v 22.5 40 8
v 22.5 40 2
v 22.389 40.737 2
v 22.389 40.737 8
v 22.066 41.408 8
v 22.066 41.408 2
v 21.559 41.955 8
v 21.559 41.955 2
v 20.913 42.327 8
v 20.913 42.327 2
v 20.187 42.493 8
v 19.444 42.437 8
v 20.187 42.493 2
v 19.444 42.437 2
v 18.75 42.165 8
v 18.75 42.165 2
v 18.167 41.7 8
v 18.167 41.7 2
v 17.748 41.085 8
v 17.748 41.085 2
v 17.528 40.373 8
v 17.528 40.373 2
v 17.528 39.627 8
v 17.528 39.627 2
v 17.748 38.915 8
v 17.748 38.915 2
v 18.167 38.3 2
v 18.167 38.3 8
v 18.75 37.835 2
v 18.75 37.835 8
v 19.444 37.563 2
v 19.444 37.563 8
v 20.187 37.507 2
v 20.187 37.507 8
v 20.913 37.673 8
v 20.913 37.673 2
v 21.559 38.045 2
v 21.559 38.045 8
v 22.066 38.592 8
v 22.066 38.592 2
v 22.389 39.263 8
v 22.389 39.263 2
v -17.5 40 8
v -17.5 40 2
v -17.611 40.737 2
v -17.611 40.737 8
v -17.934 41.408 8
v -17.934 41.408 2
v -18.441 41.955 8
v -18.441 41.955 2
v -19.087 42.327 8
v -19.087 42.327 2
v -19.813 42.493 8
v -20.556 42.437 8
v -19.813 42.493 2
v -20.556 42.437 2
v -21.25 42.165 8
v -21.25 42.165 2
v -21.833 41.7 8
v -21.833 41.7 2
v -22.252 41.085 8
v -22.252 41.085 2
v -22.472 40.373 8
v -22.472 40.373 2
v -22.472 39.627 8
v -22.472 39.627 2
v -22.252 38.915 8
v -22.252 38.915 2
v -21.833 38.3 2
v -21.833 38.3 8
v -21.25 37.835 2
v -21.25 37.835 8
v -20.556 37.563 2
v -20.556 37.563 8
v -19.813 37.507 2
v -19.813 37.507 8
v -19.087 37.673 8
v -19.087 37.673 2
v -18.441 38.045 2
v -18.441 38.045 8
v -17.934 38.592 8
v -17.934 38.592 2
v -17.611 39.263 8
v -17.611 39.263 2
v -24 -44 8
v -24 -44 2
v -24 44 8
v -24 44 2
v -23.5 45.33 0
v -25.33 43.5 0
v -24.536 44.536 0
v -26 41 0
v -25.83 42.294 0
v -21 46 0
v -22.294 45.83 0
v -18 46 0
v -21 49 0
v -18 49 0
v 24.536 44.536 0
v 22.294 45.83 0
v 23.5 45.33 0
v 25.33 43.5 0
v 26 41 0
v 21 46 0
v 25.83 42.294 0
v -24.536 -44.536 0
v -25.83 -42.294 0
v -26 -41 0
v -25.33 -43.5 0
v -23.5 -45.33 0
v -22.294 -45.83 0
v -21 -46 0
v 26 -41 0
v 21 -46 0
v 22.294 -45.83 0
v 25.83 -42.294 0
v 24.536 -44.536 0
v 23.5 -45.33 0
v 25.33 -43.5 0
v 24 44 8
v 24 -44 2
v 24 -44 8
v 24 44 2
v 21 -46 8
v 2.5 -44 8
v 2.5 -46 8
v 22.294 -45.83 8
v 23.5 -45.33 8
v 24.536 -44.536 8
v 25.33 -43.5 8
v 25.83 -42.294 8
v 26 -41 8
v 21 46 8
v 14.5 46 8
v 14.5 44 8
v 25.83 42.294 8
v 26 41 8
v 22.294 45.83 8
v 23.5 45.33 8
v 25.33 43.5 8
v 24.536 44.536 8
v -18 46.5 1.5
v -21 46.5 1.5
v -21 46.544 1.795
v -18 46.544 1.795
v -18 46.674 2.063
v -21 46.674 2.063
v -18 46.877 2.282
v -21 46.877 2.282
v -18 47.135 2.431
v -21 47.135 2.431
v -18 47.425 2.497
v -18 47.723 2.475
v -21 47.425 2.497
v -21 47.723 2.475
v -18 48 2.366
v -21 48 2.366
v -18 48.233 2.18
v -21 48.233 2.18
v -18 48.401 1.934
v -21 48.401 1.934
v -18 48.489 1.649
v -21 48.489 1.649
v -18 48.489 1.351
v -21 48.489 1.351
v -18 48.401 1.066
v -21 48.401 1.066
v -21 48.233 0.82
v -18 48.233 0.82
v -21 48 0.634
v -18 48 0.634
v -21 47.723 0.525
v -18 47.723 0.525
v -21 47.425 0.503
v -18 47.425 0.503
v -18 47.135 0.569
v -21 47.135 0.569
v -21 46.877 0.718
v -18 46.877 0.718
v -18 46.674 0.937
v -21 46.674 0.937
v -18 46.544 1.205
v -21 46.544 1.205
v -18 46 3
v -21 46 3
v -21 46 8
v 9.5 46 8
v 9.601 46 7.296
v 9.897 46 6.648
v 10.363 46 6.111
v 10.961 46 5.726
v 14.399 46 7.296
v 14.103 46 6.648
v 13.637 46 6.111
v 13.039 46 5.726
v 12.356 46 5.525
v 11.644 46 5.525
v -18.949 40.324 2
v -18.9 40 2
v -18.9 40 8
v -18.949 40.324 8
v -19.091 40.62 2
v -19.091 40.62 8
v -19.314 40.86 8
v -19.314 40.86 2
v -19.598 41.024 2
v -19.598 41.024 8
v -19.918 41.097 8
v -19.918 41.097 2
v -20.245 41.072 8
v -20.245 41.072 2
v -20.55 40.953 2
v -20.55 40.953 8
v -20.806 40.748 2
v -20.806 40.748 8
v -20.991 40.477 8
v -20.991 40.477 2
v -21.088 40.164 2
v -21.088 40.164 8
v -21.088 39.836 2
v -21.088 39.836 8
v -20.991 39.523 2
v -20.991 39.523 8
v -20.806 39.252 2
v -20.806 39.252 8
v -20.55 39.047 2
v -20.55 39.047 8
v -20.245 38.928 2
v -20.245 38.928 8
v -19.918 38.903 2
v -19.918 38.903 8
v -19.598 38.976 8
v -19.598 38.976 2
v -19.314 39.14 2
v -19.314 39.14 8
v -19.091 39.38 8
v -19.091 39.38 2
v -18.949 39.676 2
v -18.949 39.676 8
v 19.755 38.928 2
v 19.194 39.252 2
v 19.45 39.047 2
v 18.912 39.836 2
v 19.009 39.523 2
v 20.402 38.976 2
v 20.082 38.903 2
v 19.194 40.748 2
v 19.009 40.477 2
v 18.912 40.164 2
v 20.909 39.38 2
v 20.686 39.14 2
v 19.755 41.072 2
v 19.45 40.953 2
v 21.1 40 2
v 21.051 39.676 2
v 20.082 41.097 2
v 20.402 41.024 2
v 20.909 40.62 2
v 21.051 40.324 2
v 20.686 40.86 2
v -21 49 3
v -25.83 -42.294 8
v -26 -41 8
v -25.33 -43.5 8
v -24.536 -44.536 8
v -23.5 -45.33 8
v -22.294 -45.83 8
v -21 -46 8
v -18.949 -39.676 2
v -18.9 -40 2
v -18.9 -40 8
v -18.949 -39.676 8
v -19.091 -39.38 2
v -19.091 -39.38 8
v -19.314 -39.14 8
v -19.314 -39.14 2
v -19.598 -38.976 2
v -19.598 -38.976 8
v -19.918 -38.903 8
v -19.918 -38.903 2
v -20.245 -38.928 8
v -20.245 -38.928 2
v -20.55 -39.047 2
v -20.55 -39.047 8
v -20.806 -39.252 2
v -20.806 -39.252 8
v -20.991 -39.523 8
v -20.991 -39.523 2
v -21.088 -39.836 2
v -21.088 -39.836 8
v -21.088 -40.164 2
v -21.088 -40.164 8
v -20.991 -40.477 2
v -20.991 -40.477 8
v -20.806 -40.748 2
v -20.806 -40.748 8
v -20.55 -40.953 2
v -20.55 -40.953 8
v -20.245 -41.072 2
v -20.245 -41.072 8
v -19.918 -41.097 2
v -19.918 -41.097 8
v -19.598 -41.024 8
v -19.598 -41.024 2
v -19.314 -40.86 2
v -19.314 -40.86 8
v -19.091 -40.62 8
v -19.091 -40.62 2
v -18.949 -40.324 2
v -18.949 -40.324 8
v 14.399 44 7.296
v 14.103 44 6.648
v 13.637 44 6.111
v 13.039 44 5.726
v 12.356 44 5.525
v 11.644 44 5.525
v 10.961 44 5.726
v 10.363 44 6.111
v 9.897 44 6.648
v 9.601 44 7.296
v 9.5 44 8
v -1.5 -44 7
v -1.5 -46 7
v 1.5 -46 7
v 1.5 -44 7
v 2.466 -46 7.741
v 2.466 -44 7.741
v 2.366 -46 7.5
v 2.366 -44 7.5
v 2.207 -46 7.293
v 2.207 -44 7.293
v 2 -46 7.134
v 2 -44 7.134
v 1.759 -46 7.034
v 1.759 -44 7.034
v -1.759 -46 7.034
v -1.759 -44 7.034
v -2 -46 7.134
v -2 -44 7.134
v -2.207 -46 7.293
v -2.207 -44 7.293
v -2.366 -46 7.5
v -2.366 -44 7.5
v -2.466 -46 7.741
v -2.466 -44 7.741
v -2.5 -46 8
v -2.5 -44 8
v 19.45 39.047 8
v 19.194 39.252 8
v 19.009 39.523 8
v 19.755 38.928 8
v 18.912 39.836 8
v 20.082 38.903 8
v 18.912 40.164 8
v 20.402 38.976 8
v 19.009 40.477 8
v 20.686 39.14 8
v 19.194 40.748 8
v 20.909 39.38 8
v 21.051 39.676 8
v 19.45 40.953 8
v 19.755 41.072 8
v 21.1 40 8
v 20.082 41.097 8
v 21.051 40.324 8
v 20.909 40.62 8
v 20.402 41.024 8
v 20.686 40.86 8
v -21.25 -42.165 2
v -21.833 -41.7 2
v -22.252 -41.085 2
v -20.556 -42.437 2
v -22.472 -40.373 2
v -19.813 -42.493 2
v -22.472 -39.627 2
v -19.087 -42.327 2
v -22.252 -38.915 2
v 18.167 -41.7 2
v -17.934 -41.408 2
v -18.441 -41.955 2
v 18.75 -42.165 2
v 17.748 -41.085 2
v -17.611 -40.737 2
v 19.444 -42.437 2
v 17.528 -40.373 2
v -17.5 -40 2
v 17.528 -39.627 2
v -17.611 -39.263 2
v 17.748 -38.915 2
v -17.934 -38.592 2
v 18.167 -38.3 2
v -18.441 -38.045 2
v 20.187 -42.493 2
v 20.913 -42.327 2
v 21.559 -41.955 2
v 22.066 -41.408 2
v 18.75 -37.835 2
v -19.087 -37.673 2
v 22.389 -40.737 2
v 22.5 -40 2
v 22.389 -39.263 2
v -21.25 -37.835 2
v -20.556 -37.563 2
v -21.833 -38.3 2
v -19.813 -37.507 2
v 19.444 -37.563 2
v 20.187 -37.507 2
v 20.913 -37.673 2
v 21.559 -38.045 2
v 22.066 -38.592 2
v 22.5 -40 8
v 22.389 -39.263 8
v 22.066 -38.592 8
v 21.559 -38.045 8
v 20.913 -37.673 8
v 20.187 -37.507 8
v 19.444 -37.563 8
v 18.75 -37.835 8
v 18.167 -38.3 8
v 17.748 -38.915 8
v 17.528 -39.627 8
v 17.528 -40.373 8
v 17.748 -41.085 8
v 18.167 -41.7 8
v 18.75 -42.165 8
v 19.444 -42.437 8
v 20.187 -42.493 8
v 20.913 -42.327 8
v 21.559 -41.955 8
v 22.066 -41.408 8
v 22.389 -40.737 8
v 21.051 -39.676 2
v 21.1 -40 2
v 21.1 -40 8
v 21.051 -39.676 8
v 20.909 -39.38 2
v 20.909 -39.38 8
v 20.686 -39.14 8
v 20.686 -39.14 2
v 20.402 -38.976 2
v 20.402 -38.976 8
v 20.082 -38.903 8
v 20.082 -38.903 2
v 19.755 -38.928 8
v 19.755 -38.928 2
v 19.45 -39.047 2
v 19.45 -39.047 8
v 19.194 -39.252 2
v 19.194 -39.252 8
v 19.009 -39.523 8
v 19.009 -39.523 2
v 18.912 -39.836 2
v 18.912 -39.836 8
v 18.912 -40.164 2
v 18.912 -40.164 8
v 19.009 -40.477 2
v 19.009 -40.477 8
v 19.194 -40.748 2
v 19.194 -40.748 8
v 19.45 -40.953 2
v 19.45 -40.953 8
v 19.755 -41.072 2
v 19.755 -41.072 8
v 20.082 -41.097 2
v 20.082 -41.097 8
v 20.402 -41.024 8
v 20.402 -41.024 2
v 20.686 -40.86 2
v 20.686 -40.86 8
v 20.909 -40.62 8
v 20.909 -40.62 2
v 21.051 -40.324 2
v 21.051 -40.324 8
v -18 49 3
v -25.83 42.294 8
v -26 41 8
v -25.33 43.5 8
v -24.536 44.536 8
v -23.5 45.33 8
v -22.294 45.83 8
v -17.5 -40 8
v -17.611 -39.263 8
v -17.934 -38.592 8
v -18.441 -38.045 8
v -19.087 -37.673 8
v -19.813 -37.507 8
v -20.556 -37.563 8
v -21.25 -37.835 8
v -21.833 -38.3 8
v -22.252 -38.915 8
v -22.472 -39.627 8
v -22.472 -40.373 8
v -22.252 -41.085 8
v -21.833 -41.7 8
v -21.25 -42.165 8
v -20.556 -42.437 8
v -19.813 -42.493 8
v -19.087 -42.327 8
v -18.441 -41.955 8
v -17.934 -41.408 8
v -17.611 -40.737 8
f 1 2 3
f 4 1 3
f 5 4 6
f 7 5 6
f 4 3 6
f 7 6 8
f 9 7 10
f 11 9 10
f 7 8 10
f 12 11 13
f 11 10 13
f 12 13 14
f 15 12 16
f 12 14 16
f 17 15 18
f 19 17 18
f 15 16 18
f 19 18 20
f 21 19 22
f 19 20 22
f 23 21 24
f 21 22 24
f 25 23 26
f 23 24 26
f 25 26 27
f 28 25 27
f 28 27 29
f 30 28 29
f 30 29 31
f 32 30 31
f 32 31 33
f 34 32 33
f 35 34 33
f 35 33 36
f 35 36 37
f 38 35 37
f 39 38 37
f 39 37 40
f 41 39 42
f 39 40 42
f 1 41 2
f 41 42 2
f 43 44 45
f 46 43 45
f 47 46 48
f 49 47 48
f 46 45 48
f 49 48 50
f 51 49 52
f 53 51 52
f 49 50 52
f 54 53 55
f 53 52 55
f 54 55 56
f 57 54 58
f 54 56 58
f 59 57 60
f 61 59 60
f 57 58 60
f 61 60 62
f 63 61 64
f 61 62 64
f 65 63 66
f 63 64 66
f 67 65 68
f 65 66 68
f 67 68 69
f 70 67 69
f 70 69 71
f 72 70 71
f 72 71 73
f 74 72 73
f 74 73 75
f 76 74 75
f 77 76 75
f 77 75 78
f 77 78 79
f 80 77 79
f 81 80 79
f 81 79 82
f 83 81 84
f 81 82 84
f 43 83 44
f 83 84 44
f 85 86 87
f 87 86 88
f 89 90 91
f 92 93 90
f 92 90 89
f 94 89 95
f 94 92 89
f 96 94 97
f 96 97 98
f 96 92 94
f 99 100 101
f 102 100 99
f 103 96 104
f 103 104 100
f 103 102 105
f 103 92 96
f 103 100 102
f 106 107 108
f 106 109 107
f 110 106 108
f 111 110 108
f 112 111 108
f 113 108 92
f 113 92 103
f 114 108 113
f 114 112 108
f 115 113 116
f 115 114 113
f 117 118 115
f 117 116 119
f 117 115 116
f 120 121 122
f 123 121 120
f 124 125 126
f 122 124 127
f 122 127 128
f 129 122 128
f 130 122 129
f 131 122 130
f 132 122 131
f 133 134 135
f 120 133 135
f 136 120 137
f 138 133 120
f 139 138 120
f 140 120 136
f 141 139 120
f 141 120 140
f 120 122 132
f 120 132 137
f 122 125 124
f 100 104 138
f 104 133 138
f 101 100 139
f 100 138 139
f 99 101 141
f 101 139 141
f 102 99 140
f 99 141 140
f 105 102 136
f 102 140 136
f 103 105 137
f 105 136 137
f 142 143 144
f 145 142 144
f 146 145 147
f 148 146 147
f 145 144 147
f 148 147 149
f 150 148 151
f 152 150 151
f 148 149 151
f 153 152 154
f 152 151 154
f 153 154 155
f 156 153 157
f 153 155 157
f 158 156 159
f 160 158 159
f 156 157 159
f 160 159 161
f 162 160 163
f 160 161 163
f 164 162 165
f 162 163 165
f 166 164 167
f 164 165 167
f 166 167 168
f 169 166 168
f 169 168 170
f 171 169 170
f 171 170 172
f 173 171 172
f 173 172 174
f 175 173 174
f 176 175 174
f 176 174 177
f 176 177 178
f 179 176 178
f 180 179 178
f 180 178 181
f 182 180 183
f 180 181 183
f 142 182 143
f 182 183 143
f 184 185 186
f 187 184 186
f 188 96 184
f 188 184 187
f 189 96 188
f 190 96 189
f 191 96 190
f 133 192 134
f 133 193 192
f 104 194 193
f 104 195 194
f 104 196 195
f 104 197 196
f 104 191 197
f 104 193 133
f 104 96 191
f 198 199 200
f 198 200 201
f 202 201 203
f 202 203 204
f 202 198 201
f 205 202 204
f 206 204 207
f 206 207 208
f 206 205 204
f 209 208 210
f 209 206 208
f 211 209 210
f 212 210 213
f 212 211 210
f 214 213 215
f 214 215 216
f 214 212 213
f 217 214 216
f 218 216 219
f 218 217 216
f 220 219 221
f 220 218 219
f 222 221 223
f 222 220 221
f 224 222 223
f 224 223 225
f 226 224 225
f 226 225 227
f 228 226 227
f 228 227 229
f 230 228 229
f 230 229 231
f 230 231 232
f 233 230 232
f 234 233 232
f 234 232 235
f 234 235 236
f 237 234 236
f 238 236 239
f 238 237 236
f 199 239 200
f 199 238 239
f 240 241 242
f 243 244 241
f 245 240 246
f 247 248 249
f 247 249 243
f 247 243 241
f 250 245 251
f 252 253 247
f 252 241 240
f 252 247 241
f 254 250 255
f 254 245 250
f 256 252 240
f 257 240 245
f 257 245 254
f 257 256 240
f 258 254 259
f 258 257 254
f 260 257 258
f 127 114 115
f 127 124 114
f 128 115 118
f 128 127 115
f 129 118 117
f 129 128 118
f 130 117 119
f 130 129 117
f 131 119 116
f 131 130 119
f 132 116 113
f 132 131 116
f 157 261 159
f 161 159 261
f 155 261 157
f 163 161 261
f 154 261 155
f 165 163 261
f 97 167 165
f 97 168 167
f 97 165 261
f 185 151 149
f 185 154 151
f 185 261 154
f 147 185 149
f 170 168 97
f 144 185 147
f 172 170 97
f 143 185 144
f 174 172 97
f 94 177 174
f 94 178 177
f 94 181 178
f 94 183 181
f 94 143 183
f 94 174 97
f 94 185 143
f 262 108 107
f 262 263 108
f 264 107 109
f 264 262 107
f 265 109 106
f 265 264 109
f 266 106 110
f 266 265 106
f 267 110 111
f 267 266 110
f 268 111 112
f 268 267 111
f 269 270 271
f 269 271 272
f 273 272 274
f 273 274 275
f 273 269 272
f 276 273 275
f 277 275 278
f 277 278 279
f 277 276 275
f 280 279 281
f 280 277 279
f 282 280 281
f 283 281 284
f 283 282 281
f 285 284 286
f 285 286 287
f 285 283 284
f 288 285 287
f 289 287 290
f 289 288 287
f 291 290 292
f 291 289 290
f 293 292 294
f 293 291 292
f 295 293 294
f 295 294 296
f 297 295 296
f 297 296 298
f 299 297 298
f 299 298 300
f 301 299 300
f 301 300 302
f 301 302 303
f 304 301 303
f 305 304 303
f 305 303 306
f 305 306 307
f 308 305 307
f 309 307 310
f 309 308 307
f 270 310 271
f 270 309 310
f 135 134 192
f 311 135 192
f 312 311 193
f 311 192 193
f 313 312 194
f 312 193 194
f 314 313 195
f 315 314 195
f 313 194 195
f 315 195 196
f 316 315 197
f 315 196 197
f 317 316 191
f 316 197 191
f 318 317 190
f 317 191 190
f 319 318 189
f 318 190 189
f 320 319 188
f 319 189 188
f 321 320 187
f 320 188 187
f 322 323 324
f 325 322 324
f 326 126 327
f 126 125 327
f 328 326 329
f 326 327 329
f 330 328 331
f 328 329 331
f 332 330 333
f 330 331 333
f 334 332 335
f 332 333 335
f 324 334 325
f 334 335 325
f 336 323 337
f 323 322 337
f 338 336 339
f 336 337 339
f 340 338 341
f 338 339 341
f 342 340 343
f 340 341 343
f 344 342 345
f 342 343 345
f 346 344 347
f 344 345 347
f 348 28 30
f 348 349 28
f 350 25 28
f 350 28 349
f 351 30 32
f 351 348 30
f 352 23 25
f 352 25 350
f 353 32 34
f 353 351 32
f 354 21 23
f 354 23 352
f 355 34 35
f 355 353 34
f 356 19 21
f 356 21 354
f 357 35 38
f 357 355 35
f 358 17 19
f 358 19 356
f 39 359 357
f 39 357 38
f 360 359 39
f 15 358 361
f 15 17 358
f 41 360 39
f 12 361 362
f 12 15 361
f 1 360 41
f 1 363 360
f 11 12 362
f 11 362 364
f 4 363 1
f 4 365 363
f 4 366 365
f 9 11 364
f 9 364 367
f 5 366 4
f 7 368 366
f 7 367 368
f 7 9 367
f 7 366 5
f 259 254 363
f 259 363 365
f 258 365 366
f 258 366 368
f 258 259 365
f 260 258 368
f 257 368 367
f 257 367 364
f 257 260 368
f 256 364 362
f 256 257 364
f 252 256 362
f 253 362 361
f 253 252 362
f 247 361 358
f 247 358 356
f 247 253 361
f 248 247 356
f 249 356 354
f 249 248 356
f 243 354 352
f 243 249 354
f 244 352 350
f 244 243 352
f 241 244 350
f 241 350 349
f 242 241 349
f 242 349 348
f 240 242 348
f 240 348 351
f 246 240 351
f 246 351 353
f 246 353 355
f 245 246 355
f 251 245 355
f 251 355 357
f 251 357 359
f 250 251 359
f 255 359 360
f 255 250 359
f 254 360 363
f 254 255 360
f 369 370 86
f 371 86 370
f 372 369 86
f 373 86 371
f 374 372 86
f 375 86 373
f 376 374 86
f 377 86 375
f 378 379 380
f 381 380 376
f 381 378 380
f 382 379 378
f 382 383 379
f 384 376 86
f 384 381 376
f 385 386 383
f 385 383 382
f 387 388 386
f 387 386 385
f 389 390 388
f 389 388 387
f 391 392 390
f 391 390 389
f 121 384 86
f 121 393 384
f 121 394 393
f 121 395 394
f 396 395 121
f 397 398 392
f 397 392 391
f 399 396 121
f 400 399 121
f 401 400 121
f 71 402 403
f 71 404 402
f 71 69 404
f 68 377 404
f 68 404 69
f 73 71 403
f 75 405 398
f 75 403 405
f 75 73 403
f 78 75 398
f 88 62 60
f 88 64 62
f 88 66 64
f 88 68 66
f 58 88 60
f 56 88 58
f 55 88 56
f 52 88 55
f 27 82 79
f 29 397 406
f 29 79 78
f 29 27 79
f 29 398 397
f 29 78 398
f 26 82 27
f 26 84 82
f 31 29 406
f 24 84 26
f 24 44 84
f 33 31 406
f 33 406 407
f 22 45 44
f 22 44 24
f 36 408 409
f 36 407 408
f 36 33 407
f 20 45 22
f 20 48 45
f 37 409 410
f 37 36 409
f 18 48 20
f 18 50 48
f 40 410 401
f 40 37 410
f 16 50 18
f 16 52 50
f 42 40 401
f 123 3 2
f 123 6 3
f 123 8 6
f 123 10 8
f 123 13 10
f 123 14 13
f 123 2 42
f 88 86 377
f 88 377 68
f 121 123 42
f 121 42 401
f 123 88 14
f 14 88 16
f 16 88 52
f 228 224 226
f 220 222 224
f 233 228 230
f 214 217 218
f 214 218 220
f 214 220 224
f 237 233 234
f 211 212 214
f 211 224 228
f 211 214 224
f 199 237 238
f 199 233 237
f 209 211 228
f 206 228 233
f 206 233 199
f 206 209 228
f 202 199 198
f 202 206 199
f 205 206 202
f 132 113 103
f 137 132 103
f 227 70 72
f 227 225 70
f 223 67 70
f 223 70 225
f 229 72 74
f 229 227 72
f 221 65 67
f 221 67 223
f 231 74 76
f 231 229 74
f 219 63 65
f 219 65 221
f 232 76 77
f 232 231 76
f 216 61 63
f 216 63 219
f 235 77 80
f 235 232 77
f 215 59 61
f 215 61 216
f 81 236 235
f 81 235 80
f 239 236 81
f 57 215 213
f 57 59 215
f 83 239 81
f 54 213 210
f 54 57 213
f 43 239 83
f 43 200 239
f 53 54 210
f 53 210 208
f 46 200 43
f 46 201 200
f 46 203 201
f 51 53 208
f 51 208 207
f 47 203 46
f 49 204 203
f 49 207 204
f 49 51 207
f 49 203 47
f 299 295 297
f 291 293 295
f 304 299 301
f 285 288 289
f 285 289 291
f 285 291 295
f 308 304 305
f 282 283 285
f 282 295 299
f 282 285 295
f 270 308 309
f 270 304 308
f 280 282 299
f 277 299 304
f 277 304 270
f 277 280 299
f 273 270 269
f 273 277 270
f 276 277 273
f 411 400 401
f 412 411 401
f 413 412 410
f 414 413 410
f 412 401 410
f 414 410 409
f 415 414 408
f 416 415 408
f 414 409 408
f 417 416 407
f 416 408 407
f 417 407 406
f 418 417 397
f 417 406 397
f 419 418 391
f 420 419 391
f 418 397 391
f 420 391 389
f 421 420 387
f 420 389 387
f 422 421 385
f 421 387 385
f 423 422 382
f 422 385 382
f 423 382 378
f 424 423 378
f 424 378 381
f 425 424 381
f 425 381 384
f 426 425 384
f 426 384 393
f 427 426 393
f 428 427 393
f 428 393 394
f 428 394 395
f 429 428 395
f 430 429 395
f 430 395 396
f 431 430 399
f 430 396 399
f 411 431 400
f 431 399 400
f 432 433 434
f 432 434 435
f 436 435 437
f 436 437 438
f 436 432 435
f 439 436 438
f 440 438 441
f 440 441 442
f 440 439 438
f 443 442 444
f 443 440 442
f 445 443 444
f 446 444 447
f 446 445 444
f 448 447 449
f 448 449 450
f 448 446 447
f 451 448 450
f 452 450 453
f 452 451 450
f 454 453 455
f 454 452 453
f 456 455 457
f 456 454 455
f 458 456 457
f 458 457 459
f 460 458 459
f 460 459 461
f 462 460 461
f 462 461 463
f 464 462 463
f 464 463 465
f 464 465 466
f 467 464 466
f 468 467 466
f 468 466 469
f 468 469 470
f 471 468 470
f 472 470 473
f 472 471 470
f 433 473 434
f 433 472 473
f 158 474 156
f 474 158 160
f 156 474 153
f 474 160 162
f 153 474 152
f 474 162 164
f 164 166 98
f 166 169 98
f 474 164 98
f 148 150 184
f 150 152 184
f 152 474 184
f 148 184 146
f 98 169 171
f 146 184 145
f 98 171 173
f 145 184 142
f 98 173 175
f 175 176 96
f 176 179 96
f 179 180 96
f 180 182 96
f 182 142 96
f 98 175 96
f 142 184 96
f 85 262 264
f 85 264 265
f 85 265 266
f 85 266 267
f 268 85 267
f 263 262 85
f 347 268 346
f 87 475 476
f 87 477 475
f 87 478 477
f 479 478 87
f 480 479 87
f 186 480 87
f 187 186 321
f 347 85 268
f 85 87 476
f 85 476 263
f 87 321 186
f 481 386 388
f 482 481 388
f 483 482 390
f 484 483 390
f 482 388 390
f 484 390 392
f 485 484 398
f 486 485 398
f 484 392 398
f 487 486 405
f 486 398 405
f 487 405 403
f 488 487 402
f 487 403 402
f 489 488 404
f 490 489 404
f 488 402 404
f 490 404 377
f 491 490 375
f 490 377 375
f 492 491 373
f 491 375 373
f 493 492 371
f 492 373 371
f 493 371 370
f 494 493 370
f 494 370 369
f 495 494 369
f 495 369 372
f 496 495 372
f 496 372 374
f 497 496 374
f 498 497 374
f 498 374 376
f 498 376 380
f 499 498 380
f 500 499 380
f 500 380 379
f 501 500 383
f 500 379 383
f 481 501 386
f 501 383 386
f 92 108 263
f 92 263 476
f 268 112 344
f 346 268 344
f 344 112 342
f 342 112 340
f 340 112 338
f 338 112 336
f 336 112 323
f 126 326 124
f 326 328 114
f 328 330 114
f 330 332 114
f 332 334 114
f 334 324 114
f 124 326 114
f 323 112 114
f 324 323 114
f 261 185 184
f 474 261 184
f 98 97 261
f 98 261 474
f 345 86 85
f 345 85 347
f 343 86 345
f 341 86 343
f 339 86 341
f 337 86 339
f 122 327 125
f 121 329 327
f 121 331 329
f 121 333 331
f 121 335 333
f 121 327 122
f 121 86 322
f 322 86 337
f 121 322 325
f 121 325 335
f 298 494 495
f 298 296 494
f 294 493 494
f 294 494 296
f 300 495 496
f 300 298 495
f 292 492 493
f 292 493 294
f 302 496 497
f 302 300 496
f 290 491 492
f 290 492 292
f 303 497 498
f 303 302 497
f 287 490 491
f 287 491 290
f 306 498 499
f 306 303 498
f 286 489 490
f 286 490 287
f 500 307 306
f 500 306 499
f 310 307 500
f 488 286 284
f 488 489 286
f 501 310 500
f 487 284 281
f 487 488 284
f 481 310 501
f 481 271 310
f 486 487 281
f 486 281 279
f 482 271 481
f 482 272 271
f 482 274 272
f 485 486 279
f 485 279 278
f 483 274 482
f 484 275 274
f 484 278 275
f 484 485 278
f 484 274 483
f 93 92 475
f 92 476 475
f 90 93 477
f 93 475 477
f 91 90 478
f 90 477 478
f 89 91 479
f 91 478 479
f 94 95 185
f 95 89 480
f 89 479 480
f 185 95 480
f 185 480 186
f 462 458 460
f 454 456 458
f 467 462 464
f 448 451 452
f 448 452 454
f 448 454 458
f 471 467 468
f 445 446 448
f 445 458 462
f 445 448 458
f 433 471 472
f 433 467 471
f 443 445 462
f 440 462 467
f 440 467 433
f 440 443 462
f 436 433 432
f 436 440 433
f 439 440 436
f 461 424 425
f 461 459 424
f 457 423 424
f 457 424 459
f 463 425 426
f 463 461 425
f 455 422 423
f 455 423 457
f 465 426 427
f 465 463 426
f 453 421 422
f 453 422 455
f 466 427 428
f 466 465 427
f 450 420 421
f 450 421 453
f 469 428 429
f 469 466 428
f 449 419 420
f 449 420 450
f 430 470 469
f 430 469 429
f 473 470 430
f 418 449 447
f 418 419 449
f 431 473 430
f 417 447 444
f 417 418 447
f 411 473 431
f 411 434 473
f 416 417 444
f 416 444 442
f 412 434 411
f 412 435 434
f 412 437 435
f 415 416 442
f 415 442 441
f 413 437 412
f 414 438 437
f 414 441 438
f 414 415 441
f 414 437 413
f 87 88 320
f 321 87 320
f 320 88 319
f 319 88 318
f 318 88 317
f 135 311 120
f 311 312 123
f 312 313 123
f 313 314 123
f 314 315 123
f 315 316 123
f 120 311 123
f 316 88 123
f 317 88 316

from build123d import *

# Parameters (mm, degrees)
SKETCH1_W           = 52
SKETCH1_H           = 92
SKETCH1_W_2         = 48
SKETCH1_H_2         = 88
EXTRUDE_THIN1_DEPTH = 8
SKETCH2_W           = 48
SKETCH2_H           = 88
BOSS_EXTRUDE1_DEPTH = 2
FILLET1_R           = 5
SKETCH3_R           = 2.5
SKETCH3_R_2         = 1.1
BOSS_EXTRUDE2_DEPTH = 6
SKETCH4_R           = 2.5
CUT_EXTRUDE1_DEPTH  = 10
SKETCH5_W           = 5
SKETCH5_H           = 2
CUT_EXTRUDE2_DEPTH  = 10
FILLET2_R           = 1
SKETCH6_W           = 3
SKETCH6_H           = 3
BOSS_EXTRUDE3_DEPTH = 3
SKETCH7_R           = 1
CUT_EXTRUDE3_DEPTH  = 3


with BuildPart() as part:
    # Sketch1 → Extrude-Thin1 (new body)
    with BuildSketch(Plane.XY):
        Rectangle(SKETCH1_W, SKETCH1_H)
        Rectangle(SKETCH1_W_2, SKETCH1_H_2, mode=Mode.SUBTRACT)
    extrude(amount=EXTRUDE_THIN1_DEPTH)

    # Sketch2 → Boss-Extrude1 (add)
    with BuildSketch(Plane.XY):
        Rectangle(SKETCH2_W, SKETCH2_H)
    extrude(amount=BOSS_EXTRUDE1_DEPTH)

    # Fillet1
    fillet1_edges = [part.edges().sort_by_distance(p)[0] for p in [
        (-26, 46, 4),
        (26, 46, 4),
        (26, -46, 4),
        (-26, -46, 4),
    ]]
    fillet(fillet1_edges, radius=FILLET1_R)

    # Sketch3 → Boss-Extrude2 (add)
    # profile 1 of 4: a face of its own
    with BuildSketch(Plane.XY.offset(2)):
        with Locations((-20, 40)):
            Circle(SKETCH3_R)
        with Locations((-20, 40)):
            Circle(SKETCH3_R_2, mode=Mode.SUBTRACT)
    # profile 2 of 4: a face of its own
    with BuildSketch(Plane.XY.offset(2)):
        with Locations((-20, -40)):
            Circle(SKETCH3_R)
        with Locations((-20, -40)):
            Circle(SKETCH3_R_2, mode=Mode.SUBTRACT)
    # profile 3 of 4: a face of its own
    with BuildSketch(Plane.XY.offset(2)):
        with Locations((20, -40)):
            Circle(SKETCH3_R)
        with Locations((20, -40)):
            Circle(SKETCH3_R_2, mode=Mode.SUBTRACT)
    # profile 4 of 4: a face of its own
    with BuildSketch(Plane.XY.offset(2)):
        with Locations((20, 40)):
            Circle(SKETCH3_R)
        with Locations((20, 40)):
            Circle(SKETCH3_R_2, mode=Mode.SUBTRACT)
    extrude(amount=BOSS_EXTRUDE2_DEPTH)

    # Sketch4 → Cut-Extrude1 (cut)
    with BuildSketch(Plane(origin=(0, 46, 0), x_dir=(1, 0, 0), z_dir=(0, 1, 0))):
        with Locations((12, -8)):
            Circle(SKETCH4_R)
    extrude(amount=-CUT_EXTRUDE1_DEPTH, mode=Mode.SUBTRACT)

    # Sketch5 → Cut-Extrude2 (cut)
    with BuildSketch(Plane.XZ.offset(46)):
        with Locations((0, 8)):
            Rectangle(SKETCH5_W, SKETCH5_H)
    extrude(amount=-CUT_EXTRUDE2_DEPTH, mode=Mode.SUBTRACT)

    # Fillet2
    fillet2_edges = [part.edges().sort_by_distance(p)[0] for p in [
        (-2.5, -45, 7),
        (2.5, -45, 7),
    ]]
    fillet(fillet2_edges, radius=FILLET2_R - 0.0001)  # a hair under: the kernel refuses the full size

    # Sketch6 → Boss-Extrude3 (add)
    with BuildSketch(Plane(origin=(0, 46, 0), x_dir=(1, 0, 0), z_dir=(0, 1, 0))):
        with Locations((-19.5, -1.5)):
            Rectangle(SKETCH6_W, SKETCH6_H)
    extrude(amount=BOSS_EXTRUDE3_DEPTH)

    # Sketch7 → Cut-Extrude3 (cut)
    with BuildSketch(Plane.ZY.offset(21)):
        with Locations(Location((1.5, 47.5, 0), (0, 0, 270))):
            Circle(SKETCH7_R)
    extrude(amount=-CUT_EXTRUDE3_DEPTH, mode=Mode.SUBTRACT)


solid = part.part
